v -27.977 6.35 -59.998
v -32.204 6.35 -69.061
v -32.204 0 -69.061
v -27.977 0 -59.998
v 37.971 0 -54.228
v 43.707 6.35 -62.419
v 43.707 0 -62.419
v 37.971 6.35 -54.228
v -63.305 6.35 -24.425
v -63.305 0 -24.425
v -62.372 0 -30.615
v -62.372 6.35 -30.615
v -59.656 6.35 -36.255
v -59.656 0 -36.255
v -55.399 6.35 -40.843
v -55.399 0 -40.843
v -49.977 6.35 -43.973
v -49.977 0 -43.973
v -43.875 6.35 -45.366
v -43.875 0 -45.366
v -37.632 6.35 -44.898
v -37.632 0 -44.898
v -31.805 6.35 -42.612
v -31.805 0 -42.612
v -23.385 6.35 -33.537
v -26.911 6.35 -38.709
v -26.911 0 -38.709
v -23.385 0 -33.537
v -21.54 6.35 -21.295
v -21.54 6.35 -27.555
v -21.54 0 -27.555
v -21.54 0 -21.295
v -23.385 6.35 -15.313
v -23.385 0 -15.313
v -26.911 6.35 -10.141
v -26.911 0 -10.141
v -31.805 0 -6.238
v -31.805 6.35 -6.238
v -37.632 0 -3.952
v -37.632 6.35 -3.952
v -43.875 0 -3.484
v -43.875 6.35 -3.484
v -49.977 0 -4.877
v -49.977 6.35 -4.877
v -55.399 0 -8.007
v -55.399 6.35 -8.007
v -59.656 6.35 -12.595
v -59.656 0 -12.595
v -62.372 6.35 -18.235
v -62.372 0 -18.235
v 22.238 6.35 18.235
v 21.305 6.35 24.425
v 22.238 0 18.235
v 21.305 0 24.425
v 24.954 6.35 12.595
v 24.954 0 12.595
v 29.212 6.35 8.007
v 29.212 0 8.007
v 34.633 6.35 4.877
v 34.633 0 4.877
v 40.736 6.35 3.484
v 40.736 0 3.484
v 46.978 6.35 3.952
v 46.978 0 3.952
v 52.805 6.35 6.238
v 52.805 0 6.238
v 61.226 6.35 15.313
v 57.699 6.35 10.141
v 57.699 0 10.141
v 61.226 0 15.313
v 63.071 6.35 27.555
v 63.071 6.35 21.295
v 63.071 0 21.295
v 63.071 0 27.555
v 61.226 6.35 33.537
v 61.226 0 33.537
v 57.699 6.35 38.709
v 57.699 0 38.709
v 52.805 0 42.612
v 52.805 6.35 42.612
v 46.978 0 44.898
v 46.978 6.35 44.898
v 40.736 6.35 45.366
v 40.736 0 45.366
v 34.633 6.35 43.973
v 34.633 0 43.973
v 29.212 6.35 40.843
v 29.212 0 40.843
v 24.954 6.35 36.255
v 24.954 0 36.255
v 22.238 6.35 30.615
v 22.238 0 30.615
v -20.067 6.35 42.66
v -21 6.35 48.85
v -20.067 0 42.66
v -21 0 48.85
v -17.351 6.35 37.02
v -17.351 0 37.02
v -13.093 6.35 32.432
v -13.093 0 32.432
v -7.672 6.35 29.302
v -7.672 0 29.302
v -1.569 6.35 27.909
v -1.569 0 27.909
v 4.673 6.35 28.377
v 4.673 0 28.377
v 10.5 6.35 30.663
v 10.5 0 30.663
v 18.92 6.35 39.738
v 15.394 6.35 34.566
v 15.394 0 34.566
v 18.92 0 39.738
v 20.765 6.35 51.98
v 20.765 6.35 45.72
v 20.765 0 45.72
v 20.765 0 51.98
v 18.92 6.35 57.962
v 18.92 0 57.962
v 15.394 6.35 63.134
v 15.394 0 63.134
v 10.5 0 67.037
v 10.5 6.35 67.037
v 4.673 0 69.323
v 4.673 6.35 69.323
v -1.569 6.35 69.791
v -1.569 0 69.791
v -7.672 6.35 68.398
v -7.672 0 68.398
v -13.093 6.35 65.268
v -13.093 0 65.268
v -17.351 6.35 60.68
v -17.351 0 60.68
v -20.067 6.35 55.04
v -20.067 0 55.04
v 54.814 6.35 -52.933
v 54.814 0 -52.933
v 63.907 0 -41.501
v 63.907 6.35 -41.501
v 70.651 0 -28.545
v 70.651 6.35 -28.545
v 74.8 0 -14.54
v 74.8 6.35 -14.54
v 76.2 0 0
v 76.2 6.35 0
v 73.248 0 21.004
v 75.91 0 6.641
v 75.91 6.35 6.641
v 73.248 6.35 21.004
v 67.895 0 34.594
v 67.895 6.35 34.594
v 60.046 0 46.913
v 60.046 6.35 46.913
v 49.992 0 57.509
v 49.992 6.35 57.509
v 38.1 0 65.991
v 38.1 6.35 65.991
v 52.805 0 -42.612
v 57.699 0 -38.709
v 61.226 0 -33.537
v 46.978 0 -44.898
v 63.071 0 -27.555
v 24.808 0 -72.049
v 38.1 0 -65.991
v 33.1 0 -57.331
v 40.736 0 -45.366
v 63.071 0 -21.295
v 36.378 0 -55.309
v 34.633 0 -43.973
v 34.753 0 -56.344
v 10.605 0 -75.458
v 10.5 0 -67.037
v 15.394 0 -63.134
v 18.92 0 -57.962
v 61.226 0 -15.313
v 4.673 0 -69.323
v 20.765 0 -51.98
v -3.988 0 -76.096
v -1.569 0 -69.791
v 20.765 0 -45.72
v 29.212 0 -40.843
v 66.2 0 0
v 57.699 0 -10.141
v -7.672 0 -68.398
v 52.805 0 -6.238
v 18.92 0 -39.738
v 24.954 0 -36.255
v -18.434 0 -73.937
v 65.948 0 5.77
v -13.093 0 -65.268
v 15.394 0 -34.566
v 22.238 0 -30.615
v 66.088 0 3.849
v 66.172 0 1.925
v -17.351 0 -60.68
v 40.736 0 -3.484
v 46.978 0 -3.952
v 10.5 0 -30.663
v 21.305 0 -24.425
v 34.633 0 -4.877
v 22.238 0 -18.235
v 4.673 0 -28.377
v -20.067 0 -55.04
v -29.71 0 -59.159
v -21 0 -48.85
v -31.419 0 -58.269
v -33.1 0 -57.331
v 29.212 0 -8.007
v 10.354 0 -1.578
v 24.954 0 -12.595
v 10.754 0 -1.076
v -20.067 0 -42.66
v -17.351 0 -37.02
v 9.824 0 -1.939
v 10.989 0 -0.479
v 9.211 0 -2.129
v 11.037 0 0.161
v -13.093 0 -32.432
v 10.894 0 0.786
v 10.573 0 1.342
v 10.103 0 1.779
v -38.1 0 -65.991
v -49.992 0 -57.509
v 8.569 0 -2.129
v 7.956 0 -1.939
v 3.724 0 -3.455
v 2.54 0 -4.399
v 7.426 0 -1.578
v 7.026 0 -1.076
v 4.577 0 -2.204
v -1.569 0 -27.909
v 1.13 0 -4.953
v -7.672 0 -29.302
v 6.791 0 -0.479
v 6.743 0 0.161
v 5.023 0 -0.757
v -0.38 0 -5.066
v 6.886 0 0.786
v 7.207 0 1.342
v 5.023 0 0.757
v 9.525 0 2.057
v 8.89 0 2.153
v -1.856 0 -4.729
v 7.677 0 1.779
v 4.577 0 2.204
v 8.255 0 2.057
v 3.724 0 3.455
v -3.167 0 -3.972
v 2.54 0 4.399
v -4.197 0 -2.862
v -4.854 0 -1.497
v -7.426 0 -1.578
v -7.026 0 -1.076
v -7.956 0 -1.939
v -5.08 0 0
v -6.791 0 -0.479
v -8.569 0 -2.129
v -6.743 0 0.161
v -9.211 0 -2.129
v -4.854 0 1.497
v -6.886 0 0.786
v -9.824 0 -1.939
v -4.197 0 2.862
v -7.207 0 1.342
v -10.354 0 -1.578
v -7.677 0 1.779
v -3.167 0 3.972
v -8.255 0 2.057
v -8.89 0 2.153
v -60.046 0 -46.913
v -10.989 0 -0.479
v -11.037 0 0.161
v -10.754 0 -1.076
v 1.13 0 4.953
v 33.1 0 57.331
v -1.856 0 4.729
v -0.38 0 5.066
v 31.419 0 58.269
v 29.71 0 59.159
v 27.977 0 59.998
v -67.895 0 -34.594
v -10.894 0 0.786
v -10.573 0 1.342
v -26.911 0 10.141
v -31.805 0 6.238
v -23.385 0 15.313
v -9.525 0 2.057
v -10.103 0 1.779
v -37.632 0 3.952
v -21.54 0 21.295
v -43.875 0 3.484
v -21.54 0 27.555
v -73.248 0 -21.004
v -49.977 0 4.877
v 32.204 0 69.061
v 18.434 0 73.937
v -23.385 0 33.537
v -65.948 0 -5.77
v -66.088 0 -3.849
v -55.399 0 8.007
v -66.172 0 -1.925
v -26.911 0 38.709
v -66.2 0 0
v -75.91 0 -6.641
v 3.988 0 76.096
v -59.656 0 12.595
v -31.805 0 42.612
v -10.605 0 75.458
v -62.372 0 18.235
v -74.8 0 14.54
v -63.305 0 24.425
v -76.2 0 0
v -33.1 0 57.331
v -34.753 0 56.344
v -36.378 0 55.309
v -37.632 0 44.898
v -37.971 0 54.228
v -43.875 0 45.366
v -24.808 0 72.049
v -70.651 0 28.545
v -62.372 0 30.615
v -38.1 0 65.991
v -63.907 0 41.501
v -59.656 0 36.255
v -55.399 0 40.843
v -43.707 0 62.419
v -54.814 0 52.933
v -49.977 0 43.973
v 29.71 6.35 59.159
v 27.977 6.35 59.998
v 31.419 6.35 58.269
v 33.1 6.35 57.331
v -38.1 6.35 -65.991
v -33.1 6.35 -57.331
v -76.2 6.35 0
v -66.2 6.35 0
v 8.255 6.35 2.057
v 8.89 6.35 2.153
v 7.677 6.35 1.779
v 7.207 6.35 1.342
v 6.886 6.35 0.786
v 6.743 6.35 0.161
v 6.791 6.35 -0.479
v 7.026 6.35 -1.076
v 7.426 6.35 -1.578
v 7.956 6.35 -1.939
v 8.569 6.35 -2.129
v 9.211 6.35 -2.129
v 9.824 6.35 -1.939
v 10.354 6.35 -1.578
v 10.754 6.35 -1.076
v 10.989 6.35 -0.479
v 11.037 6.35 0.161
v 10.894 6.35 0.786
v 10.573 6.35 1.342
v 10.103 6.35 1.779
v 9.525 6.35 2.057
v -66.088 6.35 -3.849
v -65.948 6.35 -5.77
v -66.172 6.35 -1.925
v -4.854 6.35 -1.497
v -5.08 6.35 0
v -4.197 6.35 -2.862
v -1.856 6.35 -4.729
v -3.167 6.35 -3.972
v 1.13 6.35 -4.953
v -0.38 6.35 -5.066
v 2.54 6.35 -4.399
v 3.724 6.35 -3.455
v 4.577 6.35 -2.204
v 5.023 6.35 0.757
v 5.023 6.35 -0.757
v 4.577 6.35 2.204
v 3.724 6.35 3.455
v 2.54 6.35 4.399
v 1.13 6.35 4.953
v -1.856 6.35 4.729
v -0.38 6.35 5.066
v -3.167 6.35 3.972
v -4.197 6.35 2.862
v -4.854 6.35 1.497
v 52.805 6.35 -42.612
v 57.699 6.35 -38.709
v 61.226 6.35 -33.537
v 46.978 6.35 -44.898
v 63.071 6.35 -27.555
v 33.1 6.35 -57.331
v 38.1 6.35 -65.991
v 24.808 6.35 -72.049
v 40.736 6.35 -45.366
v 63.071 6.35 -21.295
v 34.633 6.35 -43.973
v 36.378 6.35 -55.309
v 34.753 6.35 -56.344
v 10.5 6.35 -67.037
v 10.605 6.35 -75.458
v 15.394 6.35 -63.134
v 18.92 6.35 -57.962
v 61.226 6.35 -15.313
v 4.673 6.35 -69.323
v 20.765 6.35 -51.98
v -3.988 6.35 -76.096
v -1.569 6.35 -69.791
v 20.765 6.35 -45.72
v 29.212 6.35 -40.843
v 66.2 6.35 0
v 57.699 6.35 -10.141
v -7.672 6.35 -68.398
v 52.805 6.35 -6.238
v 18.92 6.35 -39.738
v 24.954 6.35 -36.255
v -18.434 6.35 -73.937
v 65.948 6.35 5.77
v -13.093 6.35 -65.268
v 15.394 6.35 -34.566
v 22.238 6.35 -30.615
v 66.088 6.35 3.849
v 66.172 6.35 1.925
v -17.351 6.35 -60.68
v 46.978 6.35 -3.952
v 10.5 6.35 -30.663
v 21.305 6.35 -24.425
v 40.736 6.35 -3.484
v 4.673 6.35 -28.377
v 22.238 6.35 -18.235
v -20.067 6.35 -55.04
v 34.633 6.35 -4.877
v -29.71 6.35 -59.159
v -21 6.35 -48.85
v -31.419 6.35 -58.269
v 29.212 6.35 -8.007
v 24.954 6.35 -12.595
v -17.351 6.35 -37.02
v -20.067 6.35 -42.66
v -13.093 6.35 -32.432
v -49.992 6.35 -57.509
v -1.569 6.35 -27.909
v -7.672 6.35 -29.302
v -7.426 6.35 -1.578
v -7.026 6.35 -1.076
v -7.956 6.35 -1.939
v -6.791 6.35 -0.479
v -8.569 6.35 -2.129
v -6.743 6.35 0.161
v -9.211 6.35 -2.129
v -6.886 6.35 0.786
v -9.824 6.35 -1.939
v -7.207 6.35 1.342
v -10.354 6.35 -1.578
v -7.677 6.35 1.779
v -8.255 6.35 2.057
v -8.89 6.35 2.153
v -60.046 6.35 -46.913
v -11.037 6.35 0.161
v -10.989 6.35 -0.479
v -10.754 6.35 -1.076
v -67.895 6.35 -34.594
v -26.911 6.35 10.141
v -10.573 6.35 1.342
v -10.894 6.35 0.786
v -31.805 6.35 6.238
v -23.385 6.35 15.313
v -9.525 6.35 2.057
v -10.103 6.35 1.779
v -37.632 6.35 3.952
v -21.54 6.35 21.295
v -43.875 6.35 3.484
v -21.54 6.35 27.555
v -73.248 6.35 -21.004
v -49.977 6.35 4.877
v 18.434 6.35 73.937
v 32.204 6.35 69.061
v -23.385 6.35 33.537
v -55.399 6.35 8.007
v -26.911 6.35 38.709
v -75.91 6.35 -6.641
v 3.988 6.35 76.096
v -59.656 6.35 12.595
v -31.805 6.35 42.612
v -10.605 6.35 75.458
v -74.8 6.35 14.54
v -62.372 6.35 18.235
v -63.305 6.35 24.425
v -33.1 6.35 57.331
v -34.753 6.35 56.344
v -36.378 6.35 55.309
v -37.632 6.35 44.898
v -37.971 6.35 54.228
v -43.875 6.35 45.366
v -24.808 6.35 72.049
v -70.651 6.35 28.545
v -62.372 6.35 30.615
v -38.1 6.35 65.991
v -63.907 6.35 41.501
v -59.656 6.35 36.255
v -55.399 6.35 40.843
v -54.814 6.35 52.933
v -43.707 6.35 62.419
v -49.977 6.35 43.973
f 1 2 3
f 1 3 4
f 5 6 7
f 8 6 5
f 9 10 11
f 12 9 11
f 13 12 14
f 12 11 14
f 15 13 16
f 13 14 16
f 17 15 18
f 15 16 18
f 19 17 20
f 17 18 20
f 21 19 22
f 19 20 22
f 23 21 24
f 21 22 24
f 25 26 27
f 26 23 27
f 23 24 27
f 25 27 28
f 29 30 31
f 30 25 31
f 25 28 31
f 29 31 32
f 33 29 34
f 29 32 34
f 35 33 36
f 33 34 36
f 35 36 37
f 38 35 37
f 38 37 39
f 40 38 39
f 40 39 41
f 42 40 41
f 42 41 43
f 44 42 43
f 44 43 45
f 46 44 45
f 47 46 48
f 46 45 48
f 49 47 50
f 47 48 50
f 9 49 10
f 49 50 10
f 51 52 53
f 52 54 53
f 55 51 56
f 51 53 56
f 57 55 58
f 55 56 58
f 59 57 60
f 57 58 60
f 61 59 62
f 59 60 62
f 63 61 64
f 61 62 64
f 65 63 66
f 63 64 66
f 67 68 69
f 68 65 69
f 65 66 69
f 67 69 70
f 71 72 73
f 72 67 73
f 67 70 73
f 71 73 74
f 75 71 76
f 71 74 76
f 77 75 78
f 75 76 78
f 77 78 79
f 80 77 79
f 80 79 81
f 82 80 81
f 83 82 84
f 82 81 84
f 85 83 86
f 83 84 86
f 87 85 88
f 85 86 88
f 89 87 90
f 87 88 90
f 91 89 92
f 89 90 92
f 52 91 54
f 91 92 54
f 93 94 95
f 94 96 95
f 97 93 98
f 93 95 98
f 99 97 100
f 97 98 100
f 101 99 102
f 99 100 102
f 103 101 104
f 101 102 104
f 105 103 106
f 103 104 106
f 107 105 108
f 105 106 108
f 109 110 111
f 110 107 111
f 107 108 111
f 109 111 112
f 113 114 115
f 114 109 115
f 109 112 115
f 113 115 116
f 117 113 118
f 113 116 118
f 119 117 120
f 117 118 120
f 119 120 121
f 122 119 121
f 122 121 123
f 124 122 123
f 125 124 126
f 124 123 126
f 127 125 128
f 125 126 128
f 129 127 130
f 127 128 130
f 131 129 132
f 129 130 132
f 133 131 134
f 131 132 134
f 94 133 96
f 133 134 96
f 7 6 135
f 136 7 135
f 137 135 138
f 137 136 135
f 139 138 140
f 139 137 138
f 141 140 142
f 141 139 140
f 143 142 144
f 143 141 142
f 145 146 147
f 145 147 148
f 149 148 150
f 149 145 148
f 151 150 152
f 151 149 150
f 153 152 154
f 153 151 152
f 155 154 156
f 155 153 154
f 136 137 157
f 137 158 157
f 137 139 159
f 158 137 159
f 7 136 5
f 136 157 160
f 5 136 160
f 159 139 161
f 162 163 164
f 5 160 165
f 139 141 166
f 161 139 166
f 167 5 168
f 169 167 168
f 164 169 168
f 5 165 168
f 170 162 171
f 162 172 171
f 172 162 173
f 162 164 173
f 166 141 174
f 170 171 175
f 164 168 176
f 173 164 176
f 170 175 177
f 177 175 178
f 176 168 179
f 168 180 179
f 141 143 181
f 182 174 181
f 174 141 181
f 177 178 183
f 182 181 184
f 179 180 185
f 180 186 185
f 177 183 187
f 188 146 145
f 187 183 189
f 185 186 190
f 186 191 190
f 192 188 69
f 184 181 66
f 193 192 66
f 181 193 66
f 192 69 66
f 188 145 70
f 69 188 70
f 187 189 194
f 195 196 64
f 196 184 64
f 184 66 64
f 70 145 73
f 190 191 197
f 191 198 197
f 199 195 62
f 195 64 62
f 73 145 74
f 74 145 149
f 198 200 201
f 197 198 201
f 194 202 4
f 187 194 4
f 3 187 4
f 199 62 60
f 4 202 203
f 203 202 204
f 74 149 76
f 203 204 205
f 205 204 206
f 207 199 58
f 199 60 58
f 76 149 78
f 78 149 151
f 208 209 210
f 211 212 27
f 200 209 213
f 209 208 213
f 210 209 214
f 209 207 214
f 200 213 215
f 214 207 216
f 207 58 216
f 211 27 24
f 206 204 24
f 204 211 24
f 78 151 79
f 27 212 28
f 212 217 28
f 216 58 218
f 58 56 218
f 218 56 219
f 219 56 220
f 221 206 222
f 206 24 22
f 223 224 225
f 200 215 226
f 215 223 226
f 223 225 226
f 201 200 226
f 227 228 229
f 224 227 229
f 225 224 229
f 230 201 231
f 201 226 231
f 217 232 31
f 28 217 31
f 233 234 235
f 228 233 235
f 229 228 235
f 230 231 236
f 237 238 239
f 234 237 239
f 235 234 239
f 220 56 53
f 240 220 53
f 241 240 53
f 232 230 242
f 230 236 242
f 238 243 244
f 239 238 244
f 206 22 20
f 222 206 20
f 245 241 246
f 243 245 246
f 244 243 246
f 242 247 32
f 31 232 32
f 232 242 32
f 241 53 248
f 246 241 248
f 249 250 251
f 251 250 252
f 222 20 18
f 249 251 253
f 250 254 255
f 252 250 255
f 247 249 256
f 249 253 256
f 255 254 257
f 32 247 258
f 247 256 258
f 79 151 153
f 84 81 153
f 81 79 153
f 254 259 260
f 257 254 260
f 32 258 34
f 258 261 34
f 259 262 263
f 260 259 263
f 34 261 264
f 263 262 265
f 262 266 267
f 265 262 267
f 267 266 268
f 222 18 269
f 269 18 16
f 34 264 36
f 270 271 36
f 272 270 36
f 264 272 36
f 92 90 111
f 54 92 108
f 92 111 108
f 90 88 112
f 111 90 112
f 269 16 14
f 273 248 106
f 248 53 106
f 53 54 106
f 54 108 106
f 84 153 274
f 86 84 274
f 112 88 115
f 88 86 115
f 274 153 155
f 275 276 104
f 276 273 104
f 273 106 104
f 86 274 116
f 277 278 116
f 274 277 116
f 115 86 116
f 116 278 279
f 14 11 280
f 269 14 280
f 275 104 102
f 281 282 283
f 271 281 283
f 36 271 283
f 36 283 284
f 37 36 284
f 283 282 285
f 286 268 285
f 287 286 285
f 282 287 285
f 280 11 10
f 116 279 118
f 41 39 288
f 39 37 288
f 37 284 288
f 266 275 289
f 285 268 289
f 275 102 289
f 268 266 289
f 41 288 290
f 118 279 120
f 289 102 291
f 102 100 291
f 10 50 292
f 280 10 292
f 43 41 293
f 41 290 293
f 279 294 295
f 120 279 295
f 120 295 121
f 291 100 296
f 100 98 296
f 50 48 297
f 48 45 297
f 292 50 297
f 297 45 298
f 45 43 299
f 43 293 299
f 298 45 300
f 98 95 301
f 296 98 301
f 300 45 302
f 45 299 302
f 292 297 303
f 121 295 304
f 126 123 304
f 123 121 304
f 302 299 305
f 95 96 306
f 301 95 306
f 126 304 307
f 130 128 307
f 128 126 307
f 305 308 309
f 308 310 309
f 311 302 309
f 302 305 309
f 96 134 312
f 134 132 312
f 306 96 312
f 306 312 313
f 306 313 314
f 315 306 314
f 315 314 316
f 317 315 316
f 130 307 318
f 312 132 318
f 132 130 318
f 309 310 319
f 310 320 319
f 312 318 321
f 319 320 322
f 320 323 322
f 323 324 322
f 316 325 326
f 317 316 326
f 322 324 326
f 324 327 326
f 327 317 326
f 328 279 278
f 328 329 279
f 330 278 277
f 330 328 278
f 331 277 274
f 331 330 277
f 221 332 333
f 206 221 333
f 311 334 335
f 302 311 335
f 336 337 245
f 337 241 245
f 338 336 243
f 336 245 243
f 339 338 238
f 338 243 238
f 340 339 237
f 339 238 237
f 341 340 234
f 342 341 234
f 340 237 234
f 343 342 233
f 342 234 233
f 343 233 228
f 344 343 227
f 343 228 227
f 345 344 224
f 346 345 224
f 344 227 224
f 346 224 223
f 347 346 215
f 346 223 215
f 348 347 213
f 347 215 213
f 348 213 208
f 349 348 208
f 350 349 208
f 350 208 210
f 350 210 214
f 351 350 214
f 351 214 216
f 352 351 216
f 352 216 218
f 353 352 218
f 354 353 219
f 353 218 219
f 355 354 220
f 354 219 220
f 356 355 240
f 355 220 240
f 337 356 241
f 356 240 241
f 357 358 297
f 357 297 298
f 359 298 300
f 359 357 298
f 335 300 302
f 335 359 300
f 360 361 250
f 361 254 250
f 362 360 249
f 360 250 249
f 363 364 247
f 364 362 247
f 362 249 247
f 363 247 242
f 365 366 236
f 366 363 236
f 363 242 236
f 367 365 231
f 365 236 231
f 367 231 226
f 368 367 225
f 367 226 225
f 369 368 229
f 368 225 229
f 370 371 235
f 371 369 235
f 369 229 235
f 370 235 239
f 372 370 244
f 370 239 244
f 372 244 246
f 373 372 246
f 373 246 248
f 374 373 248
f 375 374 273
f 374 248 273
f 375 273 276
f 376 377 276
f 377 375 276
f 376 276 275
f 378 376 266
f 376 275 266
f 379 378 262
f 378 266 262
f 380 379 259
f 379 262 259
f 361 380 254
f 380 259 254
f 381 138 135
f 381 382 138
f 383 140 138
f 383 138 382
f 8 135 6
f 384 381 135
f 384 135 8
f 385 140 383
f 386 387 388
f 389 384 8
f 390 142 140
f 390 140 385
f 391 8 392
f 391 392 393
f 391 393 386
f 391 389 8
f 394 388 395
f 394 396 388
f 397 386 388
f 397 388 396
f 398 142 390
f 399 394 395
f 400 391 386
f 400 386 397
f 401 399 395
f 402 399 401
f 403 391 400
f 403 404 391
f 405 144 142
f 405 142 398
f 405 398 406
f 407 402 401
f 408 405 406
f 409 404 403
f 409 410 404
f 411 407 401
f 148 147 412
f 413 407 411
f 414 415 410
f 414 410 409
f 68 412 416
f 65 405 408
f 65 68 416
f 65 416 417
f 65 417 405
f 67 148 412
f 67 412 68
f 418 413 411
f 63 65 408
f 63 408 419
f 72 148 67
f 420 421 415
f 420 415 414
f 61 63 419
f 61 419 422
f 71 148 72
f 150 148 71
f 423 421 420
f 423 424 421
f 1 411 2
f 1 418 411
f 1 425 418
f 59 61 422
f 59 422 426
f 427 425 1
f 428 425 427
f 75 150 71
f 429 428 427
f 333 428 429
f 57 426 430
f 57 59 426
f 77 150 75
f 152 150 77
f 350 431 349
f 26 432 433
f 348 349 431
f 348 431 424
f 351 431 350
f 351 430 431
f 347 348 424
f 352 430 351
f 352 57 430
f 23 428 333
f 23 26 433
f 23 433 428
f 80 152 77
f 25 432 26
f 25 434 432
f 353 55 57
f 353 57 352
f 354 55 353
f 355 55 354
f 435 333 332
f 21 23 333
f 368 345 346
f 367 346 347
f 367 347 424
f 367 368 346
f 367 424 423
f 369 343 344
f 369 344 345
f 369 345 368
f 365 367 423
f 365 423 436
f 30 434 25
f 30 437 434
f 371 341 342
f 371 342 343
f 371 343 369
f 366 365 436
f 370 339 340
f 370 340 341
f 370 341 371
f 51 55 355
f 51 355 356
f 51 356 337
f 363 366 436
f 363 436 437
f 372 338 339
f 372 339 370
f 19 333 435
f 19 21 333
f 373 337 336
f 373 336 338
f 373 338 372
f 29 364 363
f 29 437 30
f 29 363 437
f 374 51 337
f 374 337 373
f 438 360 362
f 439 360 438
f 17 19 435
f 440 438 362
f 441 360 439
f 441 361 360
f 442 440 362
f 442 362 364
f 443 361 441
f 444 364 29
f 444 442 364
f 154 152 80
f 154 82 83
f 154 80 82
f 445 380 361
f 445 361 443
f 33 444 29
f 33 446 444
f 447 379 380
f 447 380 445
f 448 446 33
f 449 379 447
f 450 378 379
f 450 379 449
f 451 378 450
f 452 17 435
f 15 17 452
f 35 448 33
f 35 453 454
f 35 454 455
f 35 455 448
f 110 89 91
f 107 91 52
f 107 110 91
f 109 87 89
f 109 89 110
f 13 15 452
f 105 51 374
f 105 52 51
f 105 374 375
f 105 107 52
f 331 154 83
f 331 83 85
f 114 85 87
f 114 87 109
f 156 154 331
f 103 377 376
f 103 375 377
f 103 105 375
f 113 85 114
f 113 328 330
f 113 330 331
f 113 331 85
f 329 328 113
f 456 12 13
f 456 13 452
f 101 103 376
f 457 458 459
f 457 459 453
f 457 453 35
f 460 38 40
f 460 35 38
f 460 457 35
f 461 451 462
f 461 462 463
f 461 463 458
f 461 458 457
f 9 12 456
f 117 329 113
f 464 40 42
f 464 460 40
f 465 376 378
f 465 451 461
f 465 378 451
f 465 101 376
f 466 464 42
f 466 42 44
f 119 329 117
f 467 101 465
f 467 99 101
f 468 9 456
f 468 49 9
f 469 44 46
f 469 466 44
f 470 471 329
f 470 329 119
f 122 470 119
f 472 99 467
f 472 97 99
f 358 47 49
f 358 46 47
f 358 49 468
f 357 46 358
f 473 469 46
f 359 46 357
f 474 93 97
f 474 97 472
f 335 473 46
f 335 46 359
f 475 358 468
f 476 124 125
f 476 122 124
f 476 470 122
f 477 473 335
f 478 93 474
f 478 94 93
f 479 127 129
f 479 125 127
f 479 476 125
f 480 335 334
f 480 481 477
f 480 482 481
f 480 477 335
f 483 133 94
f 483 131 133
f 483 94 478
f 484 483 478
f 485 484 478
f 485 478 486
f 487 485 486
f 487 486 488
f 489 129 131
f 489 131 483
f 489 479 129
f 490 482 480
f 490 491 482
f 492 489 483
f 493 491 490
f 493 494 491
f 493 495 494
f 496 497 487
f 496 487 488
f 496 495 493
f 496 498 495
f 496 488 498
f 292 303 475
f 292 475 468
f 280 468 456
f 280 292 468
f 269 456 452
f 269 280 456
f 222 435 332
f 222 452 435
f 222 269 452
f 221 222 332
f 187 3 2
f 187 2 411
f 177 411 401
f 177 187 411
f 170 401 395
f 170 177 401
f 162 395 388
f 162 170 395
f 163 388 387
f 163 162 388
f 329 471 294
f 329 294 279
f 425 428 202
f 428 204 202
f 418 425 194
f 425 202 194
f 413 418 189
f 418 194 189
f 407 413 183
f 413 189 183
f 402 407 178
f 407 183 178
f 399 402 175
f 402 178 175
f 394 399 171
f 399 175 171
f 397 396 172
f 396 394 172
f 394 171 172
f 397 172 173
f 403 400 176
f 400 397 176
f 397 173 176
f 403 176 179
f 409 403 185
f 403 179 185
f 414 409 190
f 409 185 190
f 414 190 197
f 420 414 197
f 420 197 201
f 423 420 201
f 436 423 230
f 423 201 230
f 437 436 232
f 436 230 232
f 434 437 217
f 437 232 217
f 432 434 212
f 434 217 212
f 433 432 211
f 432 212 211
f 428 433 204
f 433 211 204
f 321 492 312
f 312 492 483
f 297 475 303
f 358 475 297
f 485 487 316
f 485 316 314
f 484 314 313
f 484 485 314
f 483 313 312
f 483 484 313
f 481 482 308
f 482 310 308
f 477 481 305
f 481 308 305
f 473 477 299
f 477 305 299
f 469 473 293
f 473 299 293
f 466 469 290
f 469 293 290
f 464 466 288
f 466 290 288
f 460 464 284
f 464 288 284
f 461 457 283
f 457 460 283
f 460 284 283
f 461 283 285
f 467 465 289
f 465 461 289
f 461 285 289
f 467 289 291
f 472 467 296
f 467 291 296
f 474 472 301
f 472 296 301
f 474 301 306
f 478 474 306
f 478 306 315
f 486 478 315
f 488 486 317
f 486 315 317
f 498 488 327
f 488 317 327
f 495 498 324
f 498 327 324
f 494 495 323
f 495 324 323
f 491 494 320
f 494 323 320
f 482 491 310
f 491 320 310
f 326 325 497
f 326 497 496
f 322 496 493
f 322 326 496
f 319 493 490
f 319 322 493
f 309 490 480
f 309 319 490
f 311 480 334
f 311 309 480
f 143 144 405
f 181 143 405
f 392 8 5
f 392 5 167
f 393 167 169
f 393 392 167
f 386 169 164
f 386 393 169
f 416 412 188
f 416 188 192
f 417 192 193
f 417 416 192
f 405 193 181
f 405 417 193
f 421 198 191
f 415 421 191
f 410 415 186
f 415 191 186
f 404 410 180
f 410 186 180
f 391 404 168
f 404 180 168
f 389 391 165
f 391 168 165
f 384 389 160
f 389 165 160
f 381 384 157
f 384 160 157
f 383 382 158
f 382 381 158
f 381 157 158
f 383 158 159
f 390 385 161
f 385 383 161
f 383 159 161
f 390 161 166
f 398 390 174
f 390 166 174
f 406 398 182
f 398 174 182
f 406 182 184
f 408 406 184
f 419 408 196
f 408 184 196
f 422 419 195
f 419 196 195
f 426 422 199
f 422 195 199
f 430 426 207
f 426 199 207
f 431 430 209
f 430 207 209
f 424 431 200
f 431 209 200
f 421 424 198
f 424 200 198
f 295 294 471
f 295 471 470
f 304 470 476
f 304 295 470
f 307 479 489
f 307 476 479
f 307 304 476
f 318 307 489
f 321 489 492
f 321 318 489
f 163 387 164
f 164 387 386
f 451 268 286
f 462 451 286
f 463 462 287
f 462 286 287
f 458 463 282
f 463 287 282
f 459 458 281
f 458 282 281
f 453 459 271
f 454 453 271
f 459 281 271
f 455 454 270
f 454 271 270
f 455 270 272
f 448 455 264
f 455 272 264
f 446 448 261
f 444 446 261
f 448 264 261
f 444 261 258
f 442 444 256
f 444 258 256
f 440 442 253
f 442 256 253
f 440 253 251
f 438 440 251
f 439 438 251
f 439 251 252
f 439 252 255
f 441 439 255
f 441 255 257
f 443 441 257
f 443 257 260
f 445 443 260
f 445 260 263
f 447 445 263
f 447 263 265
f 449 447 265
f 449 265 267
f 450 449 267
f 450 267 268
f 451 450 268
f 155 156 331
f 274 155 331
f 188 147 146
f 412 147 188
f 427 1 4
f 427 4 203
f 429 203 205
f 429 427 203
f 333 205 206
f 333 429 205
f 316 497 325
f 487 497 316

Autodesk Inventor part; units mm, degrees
ref_plane "YZ Plane" through (0, 0, 0) normal (1, 0, 0) x (0, 1, 0)
ref_plane "XZ Plane" through (0, 0, 0) normal (0, 1, 0) x (-1, 0, 0)
ref_plane "XY Plane" through (0, 0, 0) normal (0, 0, 1) x (1, 0, 0)
sketch "Sketch1" plane through (0, 0, 0) normal (0, 1, 0) x (-1, 0, 0)
  circle A0 centre (0, -48.85) radius 21
  line L0 (0, -48.85) -> (0, 0) construction
  circle A1 centre (42.3053, -24.425) radius 21
  circle A2 centre (42.3053, 24.425) radius 21
  circle A3 centre (0, 48.85) radius 21
  circle A4 centre (-42.3053, 24.425) radius 21
  circle A5 centre (-42.3053, -24.425) radius 21
  circle A6 centre (0, 0) radius 76.2
  circle A7 centre (0, 0) radius 5.08
  dimension "d0" = 42
  dimension "d2" = 48.85
  dimension "d5" = 360
  dimension "d7" = 152.4
  dimension "d8" = 10.16
extrude "Extrusion1" add sketch "Sketch1" along normal blind 6.35
sketch "Sketch2" plane through (0, 6.35, 0) normal (0, 1, 0) x (1, 0, 0)
  circle A0 centre (0, 0) radius 5.08 projected
  line L0 (-8.89, 0) -> (8.89, 0) construction
  dimension "d11" = 17.78
hole "Hole1" at (-8.89, 6.35, 0) at (8.89, 6.35, 0) direction (0, -1, 0) diameter 4.3053 end through all
sketch "Sketch3" plane through (0, 6.35, 0) normal (0, 1, 0) x (1, 0, 0)
  circle A0 centre (-8.89, 0) radius 2.1526 projected
  circle A1 centre (0, 0) radius 5.08 projected
  circle A2 centre (0, 0) radius 76.2 projected
  line L0 (0, 0) -> (-8.89, 0) construction
  line L1 (-43.1, 74.6514) -> (-33.1, 57.3309)
  arc A3 (-36.4297, 78.1237) -> (-43.1, 74.6514) centre (0, 0) ccw
  arc A4 (-27.9773, 59.9976) -> (-33.1, 57.3309) centre (0, 0) ccw
  line L2 (-36.4297, 78.1237) -> (-27.9773, 59.9976)
  point P0 (-38.1, 65.9911)
  dimension "d30" = 60
  dimension "d35" = 20
  dimension "d37" = 20
  dimension "d38" = 65
extrude "Extrusion2" cut sketch "Sketch3" against normal through all contours L2 A4 L1 A2 | A2 L1 A3 L2 picked at (-32.0375, 65.438)
pattern_circular "Circular Pattern1" count 6 over 360 about axis through (0, -10, 0) along (0, 1, 0) of "Extrusion2"
equation "\"d37\" = d35"
properties part number "carousel-rev2"
